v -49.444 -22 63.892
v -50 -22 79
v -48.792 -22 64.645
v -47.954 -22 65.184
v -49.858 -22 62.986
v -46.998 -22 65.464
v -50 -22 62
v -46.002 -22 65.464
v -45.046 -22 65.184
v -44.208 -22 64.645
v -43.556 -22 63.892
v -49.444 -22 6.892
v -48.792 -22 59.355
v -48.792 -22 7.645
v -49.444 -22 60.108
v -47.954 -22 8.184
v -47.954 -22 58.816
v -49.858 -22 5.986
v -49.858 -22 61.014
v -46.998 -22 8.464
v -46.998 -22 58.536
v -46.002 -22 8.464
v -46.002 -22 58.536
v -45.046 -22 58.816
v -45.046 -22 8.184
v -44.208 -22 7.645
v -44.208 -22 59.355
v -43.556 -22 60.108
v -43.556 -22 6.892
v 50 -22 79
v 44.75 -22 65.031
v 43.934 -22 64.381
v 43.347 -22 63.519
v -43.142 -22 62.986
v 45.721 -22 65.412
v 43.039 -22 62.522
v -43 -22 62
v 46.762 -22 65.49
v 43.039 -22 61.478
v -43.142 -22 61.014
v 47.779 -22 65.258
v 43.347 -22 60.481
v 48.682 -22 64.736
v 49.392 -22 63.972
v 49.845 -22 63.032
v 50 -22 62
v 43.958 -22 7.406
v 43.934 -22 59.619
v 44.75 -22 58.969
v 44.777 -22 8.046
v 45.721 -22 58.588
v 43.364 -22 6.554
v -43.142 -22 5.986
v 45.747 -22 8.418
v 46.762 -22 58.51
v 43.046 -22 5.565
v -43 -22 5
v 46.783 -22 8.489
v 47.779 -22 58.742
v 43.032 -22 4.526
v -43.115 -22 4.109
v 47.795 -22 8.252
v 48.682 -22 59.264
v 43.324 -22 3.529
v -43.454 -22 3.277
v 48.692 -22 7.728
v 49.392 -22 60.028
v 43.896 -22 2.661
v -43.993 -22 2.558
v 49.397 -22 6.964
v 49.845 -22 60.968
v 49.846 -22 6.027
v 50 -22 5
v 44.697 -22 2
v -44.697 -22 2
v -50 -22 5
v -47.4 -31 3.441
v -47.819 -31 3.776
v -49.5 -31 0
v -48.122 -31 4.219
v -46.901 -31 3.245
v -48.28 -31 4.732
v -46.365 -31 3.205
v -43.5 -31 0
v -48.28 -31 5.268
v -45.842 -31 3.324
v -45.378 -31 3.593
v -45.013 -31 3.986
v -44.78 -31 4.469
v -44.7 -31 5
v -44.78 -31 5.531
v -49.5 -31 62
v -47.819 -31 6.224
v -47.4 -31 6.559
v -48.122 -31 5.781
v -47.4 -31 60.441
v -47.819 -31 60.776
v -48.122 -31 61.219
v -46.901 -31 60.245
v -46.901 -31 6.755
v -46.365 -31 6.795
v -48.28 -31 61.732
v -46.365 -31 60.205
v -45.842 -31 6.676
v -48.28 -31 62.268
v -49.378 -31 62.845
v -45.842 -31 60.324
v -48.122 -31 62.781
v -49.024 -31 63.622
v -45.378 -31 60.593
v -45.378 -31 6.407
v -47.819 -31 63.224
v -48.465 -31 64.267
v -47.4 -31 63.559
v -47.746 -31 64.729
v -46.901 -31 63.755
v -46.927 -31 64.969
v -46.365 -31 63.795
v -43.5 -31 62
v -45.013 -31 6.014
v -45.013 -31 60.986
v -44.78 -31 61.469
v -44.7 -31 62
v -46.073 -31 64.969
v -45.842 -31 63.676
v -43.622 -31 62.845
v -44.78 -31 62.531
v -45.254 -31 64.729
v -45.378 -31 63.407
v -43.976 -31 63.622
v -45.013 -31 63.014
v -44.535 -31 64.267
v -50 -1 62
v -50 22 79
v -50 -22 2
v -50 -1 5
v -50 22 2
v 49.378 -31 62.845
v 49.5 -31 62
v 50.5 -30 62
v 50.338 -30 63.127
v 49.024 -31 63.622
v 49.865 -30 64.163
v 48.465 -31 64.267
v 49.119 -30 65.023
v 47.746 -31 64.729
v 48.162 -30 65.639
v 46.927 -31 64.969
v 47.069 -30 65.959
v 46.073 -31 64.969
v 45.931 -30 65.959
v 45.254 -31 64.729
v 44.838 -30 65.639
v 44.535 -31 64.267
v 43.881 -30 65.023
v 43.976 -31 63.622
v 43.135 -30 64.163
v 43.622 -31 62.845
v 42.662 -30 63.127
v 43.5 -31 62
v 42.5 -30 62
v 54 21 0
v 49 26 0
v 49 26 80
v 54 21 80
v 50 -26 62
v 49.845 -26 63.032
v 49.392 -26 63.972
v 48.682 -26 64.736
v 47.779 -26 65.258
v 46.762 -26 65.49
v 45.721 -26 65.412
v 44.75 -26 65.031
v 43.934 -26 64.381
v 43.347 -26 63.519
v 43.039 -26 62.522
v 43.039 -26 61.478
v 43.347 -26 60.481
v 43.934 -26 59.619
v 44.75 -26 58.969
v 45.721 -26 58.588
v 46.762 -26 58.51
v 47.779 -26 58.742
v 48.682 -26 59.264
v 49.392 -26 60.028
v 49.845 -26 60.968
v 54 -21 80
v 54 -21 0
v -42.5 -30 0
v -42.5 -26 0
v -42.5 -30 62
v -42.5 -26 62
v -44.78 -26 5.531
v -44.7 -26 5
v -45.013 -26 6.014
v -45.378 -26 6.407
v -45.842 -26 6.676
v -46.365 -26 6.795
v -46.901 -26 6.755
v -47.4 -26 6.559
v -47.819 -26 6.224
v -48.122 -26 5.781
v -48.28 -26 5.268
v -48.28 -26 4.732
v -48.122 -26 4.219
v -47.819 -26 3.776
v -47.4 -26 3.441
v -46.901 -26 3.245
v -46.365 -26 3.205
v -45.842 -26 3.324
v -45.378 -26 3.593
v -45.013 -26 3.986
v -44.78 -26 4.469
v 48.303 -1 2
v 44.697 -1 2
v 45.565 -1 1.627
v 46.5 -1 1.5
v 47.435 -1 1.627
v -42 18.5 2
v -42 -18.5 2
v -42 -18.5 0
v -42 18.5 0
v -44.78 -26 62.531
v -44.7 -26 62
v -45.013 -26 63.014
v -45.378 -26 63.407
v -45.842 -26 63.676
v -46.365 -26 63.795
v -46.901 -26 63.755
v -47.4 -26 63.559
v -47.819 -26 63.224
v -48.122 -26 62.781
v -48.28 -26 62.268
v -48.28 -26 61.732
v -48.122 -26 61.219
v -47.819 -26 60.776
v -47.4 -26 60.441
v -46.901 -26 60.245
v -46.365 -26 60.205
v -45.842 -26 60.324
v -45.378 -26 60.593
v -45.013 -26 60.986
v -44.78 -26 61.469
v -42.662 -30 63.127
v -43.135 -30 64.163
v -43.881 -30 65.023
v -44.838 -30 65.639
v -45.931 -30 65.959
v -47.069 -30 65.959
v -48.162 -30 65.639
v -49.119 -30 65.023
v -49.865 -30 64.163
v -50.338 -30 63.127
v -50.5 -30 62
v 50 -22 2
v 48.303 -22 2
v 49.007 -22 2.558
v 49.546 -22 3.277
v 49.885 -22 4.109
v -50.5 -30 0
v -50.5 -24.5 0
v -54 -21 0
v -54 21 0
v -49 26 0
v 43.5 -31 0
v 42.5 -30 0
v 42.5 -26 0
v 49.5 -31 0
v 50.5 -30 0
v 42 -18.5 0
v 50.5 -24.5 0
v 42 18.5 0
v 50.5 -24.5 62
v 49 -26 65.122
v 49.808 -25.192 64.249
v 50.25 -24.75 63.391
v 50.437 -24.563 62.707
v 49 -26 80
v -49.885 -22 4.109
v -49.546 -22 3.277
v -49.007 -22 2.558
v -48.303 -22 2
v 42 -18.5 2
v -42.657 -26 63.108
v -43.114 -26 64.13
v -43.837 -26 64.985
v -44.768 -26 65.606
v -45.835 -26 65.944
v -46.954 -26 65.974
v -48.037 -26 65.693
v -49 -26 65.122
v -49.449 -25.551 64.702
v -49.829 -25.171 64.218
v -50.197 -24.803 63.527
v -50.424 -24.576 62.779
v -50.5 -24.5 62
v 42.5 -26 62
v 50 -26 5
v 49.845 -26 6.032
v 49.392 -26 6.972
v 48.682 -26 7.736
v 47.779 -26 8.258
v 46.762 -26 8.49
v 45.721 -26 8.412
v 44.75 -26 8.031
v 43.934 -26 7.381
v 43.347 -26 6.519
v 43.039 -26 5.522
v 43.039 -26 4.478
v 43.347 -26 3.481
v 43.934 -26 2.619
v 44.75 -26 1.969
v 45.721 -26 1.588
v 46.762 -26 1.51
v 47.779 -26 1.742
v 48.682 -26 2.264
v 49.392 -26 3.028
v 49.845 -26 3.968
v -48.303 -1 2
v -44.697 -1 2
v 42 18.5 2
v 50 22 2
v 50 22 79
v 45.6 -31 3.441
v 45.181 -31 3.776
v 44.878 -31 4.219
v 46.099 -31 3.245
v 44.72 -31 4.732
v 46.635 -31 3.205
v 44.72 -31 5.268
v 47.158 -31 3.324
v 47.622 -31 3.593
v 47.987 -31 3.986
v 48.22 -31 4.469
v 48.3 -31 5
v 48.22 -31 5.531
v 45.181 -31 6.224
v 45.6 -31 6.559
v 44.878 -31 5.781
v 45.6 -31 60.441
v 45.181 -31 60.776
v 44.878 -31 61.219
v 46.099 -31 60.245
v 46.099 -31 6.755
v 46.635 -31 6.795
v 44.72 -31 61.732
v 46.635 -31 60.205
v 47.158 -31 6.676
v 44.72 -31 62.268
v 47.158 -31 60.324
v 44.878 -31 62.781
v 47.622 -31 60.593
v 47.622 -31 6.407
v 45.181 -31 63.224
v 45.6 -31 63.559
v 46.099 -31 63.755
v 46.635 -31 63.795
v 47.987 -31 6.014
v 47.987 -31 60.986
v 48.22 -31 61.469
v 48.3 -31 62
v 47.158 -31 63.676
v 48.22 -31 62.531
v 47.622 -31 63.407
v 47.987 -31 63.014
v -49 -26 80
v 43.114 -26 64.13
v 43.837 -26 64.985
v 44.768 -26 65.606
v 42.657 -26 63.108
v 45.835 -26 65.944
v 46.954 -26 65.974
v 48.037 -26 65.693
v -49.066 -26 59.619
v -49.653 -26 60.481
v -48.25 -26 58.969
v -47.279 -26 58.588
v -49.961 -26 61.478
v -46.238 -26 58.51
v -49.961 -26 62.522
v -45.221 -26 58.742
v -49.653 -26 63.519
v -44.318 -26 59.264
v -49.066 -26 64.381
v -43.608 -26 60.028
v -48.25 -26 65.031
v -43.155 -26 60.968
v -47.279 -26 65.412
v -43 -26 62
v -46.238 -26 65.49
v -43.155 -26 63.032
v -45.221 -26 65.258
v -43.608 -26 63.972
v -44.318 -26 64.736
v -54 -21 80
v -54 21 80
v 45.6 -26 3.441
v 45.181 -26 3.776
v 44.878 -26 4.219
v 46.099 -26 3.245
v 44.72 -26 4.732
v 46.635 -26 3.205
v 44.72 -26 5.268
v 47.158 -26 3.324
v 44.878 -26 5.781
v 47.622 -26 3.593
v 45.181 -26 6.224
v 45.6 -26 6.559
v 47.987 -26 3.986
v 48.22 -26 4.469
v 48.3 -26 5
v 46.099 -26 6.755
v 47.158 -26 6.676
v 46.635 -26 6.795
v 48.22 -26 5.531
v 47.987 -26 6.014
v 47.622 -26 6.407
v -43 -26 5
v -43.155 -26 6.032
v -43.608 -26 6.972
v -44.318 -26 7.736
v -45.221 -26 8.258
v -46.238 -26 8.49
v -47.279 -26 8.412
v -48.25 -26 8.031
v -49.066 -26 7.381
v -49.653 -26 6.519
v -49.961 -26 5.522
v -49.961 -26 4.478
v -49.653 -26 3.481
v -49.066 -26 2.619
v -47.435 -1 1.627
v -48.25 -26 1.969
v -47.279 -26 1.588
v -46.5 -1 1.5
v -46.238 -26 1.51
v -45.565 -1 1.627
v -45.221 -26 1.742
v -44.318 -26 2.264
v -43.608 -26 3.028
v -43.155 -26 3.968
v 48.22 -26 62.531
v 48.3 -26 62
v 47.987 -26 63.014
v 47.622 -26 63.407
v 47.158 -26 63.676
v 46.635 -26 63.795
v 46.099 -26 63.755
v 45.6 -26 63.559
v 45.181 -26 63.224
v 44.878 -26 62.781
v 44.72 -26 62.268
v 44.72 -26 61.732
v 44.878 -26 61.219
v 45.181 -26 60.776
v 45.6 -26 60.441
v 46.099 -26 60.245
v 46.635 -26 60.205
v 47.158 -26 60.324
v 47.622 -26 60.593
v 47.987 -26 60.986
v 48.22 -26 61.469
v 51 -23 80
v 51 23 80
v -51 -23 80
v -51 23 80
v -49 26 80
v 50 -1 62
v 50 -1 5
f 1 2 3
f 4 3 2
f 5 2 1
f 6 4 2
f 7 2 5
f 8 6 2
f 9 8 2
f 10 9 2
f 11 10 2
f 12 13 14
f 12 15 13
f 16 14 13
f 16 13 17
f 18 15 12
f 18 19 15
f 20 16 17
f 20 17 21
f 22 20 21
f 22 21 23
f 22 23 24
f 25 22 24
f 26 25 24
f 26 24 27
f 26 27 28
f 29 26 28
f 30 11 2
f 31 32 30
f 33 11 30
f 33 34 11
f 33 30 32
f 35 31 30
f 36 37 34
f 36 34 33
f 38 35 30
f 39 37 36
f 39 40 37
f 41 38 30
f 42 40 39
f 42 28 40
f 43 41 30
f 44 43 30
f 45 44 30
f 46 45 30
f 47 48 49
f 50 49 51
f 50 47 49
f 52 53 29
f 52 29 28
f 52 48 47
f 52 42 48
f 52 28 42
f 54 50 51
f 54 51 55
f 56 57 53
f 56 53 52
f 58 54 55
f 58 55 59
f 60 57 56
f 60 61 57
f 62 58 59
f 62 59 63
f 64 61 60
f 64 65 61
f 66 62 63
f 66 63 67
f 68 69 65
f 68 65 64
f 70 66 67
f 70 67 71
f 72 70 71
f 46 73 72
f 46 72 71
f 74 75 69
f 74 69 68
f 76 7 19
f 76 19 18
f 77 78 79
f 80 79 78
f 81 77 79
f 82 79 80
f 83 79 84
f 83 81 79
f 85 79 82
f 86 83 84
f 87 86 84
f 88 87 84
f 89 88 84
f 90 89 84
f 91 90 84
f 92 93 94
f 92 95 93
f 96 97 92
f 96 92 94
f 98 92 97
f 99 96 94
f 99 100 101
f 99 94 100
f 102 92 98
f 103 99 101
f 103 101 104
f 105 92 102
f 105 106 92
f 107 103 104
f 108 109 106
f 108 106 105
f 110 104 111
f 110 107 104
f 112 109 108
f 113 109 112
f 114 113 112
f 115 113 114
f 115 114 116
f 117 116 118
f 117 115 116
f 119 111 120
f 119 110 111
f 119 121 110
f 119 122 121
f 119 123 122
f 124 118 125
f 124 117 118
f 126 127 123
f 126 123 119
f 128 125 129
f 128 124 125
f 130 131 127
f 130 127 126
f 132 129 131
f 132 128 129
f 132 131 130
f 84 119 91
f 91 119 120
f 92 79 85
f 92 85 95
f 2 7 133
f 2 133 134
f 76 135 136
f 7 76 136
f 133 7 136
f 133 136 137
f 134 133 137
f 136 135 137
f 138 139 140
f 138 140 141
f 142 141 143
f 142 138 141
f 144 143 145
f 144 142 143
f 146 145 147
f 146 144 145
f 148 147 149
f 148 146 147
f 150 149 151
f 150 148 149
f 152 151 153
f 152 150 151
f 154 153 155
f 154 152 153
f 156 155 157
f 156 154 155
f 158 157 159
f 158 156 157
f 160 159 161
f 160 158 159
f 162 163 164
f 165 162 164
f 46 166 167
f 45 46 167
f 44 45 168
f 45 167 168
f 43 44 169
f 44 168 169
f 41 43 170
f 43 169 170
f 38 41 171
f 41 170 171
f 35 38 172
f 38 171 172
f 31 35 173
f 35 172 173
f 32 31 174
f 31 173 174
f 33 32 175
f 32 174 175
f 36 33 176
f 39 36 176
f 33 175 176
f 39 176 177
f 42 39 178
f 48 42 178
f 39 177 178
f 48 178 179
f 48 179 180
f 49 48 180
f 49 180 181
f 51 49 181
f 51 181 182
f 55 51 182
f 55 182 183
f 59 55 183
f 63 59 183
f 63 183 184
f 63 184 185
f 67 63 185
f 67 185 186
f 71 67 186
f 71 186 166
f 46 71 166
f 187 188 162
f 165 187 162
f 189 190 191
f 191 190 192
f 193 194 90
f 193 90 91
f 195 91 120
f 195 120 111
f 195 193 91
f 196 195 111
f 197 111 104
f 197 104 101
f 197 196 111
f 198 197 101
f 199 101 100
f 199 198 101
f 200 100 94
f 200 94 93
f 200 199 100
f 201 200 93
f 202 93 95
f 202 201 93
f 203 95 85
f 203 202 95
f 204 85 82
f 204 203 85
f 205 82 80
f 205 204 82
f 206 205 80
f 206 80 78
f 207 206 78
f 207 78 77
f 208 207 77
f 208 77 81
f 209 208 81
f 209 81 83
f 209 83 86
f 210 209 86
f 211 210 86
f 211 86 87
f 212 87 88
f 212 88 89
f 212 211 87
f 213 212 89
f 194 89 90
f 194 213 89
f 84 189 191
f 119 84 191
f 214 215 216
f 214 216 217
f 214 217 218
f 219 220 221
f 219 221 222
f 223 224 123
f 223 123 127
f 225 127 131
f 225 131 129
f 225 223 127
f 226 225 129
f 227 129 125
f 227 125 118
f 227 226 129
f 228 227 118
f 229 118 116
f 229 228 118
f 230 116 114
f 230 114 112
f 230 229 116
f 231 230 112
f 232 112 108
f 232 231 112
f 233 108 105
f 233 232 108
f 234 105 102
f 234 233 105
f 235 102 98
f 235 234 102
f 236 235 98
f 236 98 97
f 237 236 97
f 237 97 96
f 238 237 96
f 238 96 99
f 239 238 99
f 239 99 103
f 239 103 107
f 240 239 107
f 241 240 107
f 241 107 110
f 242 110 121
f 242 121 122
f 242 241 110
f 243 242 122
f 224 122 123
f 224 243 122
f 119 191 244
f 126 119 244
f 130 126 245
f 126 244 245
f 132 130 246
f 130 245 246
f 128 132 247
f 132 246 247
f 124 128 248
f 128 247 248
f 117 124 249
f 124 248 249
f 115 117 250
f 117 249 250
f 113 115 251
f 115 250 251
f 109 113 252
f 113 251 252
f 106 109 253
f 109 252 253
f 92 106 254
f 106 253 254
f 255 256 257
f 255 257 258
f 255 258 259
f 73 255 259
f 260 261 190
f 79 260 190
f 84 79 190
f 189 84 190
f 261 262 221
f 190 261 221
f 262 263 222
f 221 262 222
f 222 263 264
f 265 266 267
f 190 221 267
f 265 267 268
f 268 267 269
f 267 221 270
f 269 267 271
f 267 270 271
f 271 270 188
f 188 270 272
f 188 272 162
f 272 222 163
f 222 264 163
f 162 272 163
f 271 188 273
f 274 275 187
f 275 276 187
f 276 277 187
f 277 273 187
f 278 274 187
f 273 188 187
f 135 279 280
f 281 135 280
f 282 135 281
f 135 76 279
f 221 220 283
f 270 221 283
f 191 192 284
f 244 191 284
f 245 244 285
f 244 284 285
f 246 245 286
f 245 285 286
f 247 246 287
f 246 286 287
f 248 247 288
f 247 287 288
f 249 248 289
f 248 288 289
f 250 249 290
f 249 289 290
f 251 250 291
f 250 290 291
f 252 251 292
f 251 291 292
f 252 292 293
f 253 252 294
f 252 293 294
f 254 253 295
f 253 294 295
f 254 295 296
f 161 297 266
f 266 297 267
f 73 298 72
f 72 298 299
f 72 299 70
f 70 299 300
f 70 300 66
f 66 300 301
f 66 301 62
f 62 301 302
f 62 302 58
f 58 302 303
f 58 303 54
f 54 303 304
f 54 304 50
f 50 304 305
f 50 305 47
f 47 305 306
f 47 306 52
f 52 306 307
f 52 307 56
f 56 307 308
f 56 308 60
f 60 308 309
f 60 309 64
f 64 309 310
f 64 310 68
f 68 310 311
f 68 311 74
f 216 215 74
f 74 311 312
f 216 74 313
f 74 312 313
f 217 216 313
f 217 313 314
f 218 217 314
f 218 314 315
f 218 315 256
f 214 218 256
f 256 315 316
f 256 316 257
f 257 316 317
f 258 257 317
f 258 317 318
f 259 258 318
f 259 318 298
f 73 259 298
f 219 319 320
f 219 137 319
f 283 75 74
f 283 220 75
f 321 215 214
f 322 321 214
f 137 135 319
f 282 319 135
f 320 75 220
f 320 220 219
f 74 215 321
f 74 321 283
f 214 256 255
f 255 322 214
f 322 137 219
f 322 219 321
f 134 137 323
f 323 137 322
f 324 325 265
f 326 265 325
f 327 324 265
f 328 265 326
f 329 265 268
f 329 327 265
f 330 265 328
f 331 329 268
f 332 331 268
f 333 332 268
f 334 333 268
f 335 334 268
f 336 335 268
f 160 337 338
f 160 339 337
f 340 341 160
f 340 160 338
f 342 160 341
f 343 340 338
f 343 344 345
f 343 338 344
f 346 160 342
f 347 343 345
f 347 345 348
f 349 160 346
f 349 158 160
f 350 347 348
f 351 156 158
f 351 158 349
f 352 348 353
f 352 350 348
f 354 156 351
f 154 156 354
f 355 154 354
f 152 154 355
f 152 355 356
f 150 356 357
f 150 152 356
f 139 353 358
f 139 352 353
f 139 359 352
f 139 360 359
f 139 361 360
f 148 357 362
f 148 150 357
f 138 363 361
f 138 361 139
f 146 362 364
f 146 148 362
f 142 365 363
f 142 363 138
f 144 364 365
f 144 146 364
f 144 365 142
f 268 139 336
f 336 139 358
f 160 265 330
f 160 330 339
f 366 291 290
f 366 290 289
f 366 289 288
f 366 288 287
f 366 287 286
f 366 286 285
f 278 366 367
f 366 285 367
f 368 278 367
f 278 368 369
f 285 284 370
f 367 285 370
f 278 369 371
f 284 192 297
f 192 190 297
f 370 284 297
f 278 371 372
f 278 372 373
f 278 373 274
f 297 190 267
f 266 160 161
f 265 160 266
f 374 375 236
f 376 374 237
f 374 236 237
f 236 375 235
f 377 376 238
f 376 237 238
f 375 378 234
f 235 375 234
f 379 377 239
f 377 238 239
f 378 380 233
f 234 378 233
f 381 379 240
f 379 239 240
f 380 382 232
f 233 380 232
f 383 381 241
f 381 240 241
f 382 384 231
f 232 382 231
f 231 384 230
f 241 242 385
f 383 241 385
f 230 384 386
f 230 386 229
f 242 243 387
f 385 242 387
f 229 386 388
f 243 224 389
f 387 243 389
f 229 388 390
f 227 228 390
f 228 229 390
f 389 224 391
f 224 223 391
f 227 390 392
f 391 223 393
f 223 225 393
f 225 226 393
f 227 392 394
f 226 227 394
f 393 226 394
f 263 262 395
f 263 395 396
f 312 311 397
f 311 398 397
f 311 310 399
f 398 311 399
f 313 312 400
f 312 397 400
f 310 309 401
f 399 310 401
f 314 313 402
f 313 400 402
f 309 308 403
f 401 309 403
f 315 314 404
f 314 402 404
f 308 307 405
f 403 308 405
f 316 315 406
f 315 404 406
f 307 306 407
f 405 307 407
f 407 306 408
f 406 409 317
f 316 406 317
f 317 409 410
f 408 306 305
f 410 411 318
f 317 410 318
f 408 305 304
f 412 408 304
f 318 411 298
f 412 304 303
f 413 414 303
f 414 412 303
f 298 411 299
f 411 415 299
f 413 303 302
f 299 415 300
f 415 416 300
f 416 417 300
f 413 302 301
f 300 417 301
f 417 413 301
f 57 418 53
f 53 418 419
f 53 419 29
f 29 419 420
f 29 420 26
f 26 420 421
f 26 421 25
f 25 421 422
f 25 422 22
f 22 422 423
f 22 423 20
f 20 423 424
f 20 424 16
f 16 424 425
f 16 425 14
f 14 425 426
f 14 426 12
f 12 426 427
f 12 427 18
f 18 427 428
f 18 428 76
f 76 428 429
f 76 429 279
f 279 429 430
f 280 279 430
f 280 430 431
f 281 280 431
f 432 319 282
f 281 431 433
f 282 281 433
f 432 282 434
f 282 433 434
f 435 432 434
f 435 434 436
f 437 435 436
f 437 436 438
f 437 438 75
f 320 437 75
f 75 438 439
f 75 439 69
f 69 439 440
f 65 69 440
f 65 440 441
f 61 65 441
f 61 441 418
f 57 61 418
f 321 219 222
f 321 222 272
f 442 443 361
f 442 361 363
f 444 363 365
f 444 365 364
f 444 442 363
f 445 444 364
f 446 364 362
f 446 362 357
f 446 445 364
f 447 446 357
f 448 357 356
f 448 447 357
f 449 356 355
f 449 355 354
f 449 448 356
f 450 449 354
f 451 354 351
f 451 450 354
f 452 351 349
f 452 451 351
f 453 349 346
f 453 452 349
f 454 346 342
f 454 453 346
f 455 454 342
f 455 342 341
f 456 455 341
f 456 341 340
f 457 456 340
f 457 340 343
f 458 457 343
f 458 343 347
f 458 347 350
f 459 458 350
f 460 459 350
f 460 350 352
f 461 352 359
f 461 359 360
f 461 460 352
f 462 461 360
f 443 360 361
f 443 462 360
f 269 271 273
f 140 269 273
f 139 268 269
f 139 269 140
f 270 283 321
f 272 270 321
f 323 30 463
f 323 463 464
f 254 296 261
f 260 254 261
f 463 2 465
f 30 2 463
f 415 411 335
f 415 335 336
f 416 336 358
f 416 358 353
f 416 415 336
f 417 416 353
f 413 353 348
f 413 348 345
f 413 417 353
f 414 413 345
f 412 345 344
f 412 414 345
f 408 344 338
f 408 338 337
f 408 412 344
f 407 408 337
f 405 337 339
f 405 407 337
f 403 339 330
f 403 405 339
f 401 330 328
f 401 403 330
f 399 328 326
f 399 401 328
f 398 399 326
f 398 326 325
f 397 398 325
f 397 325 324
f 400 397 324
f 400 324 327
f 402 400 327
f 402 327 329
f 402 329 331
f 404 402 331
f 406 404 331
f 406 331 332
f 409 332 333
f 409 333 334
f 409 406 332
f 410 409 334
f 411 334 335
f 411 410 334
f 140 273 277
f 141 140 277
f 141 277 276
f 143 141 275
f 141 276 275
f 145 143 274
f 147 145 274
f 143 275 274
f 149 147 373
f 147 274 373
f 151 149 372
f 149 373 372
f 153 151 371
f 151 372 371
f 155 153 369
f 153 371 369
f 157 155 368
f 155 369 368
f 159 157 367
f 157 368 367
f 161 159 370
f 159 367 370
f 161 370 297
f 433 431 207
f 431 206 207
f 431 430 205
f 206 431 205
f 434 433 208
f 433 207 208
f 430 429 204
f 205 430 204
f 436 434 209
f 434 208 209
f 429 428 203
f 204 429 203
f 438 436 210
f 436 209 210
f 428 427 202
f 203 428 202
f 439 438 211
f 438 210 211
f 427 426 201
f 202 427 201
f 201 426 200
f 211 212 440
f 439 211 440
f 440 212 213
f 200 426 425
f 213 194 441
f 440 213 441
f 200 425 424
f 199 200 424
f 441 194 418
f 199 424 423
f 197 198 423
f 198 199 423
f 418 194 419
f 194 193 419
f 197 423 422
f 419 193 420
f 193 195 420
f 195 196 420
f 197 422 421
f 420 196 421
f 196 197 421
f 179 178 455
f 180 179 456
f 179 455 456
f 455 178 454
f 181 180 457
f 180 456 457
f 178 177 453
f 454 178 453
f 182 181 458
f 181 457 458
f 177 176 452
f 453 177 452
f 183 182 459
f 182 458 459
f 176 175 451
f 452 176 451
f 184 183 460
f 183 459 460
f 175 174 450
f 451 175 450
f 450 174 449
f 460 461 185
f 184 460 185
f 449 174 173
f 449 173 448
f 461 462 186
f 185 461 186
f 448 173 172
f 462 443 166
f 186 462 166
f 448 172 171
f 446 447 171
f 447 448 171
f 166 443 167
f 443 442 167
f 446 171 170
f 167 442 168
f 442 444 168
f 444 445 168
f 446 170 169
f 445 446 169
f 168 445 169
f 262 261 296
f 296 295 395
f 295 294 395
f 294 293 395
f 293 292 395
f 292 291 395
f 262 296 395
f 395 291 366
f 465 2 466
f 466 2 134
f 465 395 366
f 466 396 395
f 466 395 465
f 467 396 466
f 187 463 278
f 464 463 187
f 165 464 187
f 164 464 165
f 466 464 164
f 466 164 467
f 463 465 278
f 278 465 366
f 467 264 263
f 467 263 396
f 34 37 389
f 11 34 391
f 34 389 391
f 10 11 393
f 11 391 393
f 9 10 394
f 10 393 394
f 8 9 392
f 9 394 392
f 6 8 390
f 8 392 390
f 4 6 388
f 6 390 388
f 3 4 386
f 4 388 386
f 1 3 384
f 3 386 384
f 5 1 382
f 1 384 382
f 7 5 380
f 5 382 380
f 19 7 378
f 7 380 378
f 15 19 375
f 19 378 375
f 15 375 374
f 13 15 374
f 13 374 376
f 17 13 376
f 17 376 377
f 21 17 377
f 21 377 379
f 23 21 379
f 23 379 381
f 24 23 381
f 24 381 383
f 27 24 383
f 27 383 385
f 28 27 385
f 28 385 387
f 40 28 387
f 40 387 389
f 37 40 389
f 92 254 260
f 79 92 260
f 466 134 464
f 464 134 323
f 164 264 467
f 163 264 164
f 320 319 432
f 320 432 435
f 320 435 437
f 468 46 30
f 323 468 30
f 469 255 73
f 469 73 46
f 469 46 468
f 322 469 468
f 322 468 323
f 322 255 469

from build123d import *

# Parameters (mm, degrees)
F0_W     = 108
F0_H     = 52
F0_W_2   = 100
F0_H_2   = 44
F1_DEPTH = 80
F2_DEPTH = 2
F3_R     = 3.5
F3_R_2   = 1.8
F4_DEPTH = 5
F5_DEPTH = 25
F6_SIZE  = 5
F7_SIZE  = 1
F8_W     = 84
F8_H     = 37
F9_DEPTH = 25


with BuildPart() as f1:
    # F0 (on Top) → F1 (new body)
    with BuildSketch(Plane.XY):
        Rectangle(F0_W, F0_H)
        Rectangle(F0_W_2, F0_H_2, mode=Mode.SUBTRACT)
    extrude(amount=F1_DEPTH)

    # F0 (on Top) → F2 (join)
    with BuildSketch(Plane.XY):
        Rectangle(F0_W_2, F0_H_2)
    extrude(amount=F2_DEPTH)

    # F3 (on face) → F4 (join)
    with BuildSketch(Plane.XZ.offset(26)):
        with BuildLine():
            Line((-42.5, 0), (-42.5, 62))
            ThreePointArc((-42.5, 62), (-46.5, 66), (-50.5, 62))
            Line((-50.5, 62), (-50.5, 0))
            Line((-50.5, 0), (-42.5, 0))
        make_face()
        with Locations((-46.5, 5)):
            Circle(F3_R, mode=Mode.SUBTRACT)
        with Locations((-46.5, 62)):
            Circle(F3_R, mode=Mode.SUBTRACT)
        with BuildLine():
            Line((42.5, 62), (42.5, 0))
            Line((42.5, 0), (50.5, 0))
            Line((50.5, 0), (50.5, 62))
            ThreePointArc((50.5, 62), (46.5, 66), (42.5, 62))
        make_face()
        with Locations((46.5, 5)):
            Circle(F3_R, mode=Mode.SUBTRACT)
        with Locations((46.5, 62)):
            Circle(F3_R, mode=Mode.SUBTRACT)
        with Locations((46.5, 62)):
            Circle(F3_R)
        with Locations((46.5, 62)):
            Circle(F3_R_2, mode=Mode.SUBTRACT)
        with Locations((-46.5, 62)):
            Circle(F3_R)
        with Locations((-46.5, 62)):
            Circle(F3_R_2, mode=Mode.SUBTRACT)
        with Locations((-46.5, 5)):
            Circle(F3_R)
        with Locations((-46.5, 5)):
            Circle(F3_R_2, mode=Mode.SUBTRACT)
        with Locations((46.5, 5)):
            Circle(F3_R)
        with Locations((46.5, 5)):
            Circle(F3_R_2, mode=Mode.SUBTRACT)
    extrude(amount=F4_DEPTH)

    # F3 (on face) → F5 (cut)
    with BuildSketch(Plane.XZ.offset(26)):
        with Locations((-46.5, 5)):
            Circle(F3_R)
        with Locations((-46.5, 5)):
            Circle(F3_R_2, mode=Mode.SUBTRACT)
        with Locations((46.5, 5)):
            Circle(F3_R)
        with Locations((46.5, 5)):
            Circle(F3_R_2, mode=Mode.SUBTRACT)
        with Locations((46.5, 62)):
            Circle(F3_R)
        with Locations((46.5, 62)):
            Circle(F3_R_2, mode=Mode.SUBTRACT)
        with Locations((46.5, 62)):
            Circle(F3_R_2)
        with Locations((46.5, 5)):
            Circle(F3_R_2)
        with Locations((-46.5, 5)):
            Circle(F3_R_2)
        with Locations((-46.5, 62)):
            Circle(F3_R)
        with Locations((-46.5, 62)):
            Circle(F3_R_2, mode=Mode.SUBTRACT)
        with Locations((-46.5, 62)):
            Circle(F3_R_2)
    extrude(amount=-F5_DEPTH, mode=Mode.SUBTRACT)

    # F6
    f6_edges = [f1.edges().sort_by_distance(p)[0] for p in [
        (54, 26, 40),
        (54, -26, 40),
        (-54, -26, 40),
        (-54, 26, 40),
    ]]
    chamfer(f6_edges, length=F6_SIZE)

    # F7
    f7_edges = [f1.edges().sort_by_distance(p)[0] for p in [
        (0, 22, 80),
        (-50, 0, 80),
        (0, -22, 80),
        (50, 0, 80),
        (-42.5, -31, 31),
        (-50.5, -31, 31),
        (42.5, -31, 31),
    ]]
    chamfer(f7_edges, length=F7_SIZE)

    # F8 (on face) → F9 (cut)
    with BuildSketch(Plane.XY.offset(2)):
        Rectangle(F8_W, F8_H)
    extrude(amount=-F9_DEPTH, mode=Mode.SUBTRACT)


solid = f1.part
